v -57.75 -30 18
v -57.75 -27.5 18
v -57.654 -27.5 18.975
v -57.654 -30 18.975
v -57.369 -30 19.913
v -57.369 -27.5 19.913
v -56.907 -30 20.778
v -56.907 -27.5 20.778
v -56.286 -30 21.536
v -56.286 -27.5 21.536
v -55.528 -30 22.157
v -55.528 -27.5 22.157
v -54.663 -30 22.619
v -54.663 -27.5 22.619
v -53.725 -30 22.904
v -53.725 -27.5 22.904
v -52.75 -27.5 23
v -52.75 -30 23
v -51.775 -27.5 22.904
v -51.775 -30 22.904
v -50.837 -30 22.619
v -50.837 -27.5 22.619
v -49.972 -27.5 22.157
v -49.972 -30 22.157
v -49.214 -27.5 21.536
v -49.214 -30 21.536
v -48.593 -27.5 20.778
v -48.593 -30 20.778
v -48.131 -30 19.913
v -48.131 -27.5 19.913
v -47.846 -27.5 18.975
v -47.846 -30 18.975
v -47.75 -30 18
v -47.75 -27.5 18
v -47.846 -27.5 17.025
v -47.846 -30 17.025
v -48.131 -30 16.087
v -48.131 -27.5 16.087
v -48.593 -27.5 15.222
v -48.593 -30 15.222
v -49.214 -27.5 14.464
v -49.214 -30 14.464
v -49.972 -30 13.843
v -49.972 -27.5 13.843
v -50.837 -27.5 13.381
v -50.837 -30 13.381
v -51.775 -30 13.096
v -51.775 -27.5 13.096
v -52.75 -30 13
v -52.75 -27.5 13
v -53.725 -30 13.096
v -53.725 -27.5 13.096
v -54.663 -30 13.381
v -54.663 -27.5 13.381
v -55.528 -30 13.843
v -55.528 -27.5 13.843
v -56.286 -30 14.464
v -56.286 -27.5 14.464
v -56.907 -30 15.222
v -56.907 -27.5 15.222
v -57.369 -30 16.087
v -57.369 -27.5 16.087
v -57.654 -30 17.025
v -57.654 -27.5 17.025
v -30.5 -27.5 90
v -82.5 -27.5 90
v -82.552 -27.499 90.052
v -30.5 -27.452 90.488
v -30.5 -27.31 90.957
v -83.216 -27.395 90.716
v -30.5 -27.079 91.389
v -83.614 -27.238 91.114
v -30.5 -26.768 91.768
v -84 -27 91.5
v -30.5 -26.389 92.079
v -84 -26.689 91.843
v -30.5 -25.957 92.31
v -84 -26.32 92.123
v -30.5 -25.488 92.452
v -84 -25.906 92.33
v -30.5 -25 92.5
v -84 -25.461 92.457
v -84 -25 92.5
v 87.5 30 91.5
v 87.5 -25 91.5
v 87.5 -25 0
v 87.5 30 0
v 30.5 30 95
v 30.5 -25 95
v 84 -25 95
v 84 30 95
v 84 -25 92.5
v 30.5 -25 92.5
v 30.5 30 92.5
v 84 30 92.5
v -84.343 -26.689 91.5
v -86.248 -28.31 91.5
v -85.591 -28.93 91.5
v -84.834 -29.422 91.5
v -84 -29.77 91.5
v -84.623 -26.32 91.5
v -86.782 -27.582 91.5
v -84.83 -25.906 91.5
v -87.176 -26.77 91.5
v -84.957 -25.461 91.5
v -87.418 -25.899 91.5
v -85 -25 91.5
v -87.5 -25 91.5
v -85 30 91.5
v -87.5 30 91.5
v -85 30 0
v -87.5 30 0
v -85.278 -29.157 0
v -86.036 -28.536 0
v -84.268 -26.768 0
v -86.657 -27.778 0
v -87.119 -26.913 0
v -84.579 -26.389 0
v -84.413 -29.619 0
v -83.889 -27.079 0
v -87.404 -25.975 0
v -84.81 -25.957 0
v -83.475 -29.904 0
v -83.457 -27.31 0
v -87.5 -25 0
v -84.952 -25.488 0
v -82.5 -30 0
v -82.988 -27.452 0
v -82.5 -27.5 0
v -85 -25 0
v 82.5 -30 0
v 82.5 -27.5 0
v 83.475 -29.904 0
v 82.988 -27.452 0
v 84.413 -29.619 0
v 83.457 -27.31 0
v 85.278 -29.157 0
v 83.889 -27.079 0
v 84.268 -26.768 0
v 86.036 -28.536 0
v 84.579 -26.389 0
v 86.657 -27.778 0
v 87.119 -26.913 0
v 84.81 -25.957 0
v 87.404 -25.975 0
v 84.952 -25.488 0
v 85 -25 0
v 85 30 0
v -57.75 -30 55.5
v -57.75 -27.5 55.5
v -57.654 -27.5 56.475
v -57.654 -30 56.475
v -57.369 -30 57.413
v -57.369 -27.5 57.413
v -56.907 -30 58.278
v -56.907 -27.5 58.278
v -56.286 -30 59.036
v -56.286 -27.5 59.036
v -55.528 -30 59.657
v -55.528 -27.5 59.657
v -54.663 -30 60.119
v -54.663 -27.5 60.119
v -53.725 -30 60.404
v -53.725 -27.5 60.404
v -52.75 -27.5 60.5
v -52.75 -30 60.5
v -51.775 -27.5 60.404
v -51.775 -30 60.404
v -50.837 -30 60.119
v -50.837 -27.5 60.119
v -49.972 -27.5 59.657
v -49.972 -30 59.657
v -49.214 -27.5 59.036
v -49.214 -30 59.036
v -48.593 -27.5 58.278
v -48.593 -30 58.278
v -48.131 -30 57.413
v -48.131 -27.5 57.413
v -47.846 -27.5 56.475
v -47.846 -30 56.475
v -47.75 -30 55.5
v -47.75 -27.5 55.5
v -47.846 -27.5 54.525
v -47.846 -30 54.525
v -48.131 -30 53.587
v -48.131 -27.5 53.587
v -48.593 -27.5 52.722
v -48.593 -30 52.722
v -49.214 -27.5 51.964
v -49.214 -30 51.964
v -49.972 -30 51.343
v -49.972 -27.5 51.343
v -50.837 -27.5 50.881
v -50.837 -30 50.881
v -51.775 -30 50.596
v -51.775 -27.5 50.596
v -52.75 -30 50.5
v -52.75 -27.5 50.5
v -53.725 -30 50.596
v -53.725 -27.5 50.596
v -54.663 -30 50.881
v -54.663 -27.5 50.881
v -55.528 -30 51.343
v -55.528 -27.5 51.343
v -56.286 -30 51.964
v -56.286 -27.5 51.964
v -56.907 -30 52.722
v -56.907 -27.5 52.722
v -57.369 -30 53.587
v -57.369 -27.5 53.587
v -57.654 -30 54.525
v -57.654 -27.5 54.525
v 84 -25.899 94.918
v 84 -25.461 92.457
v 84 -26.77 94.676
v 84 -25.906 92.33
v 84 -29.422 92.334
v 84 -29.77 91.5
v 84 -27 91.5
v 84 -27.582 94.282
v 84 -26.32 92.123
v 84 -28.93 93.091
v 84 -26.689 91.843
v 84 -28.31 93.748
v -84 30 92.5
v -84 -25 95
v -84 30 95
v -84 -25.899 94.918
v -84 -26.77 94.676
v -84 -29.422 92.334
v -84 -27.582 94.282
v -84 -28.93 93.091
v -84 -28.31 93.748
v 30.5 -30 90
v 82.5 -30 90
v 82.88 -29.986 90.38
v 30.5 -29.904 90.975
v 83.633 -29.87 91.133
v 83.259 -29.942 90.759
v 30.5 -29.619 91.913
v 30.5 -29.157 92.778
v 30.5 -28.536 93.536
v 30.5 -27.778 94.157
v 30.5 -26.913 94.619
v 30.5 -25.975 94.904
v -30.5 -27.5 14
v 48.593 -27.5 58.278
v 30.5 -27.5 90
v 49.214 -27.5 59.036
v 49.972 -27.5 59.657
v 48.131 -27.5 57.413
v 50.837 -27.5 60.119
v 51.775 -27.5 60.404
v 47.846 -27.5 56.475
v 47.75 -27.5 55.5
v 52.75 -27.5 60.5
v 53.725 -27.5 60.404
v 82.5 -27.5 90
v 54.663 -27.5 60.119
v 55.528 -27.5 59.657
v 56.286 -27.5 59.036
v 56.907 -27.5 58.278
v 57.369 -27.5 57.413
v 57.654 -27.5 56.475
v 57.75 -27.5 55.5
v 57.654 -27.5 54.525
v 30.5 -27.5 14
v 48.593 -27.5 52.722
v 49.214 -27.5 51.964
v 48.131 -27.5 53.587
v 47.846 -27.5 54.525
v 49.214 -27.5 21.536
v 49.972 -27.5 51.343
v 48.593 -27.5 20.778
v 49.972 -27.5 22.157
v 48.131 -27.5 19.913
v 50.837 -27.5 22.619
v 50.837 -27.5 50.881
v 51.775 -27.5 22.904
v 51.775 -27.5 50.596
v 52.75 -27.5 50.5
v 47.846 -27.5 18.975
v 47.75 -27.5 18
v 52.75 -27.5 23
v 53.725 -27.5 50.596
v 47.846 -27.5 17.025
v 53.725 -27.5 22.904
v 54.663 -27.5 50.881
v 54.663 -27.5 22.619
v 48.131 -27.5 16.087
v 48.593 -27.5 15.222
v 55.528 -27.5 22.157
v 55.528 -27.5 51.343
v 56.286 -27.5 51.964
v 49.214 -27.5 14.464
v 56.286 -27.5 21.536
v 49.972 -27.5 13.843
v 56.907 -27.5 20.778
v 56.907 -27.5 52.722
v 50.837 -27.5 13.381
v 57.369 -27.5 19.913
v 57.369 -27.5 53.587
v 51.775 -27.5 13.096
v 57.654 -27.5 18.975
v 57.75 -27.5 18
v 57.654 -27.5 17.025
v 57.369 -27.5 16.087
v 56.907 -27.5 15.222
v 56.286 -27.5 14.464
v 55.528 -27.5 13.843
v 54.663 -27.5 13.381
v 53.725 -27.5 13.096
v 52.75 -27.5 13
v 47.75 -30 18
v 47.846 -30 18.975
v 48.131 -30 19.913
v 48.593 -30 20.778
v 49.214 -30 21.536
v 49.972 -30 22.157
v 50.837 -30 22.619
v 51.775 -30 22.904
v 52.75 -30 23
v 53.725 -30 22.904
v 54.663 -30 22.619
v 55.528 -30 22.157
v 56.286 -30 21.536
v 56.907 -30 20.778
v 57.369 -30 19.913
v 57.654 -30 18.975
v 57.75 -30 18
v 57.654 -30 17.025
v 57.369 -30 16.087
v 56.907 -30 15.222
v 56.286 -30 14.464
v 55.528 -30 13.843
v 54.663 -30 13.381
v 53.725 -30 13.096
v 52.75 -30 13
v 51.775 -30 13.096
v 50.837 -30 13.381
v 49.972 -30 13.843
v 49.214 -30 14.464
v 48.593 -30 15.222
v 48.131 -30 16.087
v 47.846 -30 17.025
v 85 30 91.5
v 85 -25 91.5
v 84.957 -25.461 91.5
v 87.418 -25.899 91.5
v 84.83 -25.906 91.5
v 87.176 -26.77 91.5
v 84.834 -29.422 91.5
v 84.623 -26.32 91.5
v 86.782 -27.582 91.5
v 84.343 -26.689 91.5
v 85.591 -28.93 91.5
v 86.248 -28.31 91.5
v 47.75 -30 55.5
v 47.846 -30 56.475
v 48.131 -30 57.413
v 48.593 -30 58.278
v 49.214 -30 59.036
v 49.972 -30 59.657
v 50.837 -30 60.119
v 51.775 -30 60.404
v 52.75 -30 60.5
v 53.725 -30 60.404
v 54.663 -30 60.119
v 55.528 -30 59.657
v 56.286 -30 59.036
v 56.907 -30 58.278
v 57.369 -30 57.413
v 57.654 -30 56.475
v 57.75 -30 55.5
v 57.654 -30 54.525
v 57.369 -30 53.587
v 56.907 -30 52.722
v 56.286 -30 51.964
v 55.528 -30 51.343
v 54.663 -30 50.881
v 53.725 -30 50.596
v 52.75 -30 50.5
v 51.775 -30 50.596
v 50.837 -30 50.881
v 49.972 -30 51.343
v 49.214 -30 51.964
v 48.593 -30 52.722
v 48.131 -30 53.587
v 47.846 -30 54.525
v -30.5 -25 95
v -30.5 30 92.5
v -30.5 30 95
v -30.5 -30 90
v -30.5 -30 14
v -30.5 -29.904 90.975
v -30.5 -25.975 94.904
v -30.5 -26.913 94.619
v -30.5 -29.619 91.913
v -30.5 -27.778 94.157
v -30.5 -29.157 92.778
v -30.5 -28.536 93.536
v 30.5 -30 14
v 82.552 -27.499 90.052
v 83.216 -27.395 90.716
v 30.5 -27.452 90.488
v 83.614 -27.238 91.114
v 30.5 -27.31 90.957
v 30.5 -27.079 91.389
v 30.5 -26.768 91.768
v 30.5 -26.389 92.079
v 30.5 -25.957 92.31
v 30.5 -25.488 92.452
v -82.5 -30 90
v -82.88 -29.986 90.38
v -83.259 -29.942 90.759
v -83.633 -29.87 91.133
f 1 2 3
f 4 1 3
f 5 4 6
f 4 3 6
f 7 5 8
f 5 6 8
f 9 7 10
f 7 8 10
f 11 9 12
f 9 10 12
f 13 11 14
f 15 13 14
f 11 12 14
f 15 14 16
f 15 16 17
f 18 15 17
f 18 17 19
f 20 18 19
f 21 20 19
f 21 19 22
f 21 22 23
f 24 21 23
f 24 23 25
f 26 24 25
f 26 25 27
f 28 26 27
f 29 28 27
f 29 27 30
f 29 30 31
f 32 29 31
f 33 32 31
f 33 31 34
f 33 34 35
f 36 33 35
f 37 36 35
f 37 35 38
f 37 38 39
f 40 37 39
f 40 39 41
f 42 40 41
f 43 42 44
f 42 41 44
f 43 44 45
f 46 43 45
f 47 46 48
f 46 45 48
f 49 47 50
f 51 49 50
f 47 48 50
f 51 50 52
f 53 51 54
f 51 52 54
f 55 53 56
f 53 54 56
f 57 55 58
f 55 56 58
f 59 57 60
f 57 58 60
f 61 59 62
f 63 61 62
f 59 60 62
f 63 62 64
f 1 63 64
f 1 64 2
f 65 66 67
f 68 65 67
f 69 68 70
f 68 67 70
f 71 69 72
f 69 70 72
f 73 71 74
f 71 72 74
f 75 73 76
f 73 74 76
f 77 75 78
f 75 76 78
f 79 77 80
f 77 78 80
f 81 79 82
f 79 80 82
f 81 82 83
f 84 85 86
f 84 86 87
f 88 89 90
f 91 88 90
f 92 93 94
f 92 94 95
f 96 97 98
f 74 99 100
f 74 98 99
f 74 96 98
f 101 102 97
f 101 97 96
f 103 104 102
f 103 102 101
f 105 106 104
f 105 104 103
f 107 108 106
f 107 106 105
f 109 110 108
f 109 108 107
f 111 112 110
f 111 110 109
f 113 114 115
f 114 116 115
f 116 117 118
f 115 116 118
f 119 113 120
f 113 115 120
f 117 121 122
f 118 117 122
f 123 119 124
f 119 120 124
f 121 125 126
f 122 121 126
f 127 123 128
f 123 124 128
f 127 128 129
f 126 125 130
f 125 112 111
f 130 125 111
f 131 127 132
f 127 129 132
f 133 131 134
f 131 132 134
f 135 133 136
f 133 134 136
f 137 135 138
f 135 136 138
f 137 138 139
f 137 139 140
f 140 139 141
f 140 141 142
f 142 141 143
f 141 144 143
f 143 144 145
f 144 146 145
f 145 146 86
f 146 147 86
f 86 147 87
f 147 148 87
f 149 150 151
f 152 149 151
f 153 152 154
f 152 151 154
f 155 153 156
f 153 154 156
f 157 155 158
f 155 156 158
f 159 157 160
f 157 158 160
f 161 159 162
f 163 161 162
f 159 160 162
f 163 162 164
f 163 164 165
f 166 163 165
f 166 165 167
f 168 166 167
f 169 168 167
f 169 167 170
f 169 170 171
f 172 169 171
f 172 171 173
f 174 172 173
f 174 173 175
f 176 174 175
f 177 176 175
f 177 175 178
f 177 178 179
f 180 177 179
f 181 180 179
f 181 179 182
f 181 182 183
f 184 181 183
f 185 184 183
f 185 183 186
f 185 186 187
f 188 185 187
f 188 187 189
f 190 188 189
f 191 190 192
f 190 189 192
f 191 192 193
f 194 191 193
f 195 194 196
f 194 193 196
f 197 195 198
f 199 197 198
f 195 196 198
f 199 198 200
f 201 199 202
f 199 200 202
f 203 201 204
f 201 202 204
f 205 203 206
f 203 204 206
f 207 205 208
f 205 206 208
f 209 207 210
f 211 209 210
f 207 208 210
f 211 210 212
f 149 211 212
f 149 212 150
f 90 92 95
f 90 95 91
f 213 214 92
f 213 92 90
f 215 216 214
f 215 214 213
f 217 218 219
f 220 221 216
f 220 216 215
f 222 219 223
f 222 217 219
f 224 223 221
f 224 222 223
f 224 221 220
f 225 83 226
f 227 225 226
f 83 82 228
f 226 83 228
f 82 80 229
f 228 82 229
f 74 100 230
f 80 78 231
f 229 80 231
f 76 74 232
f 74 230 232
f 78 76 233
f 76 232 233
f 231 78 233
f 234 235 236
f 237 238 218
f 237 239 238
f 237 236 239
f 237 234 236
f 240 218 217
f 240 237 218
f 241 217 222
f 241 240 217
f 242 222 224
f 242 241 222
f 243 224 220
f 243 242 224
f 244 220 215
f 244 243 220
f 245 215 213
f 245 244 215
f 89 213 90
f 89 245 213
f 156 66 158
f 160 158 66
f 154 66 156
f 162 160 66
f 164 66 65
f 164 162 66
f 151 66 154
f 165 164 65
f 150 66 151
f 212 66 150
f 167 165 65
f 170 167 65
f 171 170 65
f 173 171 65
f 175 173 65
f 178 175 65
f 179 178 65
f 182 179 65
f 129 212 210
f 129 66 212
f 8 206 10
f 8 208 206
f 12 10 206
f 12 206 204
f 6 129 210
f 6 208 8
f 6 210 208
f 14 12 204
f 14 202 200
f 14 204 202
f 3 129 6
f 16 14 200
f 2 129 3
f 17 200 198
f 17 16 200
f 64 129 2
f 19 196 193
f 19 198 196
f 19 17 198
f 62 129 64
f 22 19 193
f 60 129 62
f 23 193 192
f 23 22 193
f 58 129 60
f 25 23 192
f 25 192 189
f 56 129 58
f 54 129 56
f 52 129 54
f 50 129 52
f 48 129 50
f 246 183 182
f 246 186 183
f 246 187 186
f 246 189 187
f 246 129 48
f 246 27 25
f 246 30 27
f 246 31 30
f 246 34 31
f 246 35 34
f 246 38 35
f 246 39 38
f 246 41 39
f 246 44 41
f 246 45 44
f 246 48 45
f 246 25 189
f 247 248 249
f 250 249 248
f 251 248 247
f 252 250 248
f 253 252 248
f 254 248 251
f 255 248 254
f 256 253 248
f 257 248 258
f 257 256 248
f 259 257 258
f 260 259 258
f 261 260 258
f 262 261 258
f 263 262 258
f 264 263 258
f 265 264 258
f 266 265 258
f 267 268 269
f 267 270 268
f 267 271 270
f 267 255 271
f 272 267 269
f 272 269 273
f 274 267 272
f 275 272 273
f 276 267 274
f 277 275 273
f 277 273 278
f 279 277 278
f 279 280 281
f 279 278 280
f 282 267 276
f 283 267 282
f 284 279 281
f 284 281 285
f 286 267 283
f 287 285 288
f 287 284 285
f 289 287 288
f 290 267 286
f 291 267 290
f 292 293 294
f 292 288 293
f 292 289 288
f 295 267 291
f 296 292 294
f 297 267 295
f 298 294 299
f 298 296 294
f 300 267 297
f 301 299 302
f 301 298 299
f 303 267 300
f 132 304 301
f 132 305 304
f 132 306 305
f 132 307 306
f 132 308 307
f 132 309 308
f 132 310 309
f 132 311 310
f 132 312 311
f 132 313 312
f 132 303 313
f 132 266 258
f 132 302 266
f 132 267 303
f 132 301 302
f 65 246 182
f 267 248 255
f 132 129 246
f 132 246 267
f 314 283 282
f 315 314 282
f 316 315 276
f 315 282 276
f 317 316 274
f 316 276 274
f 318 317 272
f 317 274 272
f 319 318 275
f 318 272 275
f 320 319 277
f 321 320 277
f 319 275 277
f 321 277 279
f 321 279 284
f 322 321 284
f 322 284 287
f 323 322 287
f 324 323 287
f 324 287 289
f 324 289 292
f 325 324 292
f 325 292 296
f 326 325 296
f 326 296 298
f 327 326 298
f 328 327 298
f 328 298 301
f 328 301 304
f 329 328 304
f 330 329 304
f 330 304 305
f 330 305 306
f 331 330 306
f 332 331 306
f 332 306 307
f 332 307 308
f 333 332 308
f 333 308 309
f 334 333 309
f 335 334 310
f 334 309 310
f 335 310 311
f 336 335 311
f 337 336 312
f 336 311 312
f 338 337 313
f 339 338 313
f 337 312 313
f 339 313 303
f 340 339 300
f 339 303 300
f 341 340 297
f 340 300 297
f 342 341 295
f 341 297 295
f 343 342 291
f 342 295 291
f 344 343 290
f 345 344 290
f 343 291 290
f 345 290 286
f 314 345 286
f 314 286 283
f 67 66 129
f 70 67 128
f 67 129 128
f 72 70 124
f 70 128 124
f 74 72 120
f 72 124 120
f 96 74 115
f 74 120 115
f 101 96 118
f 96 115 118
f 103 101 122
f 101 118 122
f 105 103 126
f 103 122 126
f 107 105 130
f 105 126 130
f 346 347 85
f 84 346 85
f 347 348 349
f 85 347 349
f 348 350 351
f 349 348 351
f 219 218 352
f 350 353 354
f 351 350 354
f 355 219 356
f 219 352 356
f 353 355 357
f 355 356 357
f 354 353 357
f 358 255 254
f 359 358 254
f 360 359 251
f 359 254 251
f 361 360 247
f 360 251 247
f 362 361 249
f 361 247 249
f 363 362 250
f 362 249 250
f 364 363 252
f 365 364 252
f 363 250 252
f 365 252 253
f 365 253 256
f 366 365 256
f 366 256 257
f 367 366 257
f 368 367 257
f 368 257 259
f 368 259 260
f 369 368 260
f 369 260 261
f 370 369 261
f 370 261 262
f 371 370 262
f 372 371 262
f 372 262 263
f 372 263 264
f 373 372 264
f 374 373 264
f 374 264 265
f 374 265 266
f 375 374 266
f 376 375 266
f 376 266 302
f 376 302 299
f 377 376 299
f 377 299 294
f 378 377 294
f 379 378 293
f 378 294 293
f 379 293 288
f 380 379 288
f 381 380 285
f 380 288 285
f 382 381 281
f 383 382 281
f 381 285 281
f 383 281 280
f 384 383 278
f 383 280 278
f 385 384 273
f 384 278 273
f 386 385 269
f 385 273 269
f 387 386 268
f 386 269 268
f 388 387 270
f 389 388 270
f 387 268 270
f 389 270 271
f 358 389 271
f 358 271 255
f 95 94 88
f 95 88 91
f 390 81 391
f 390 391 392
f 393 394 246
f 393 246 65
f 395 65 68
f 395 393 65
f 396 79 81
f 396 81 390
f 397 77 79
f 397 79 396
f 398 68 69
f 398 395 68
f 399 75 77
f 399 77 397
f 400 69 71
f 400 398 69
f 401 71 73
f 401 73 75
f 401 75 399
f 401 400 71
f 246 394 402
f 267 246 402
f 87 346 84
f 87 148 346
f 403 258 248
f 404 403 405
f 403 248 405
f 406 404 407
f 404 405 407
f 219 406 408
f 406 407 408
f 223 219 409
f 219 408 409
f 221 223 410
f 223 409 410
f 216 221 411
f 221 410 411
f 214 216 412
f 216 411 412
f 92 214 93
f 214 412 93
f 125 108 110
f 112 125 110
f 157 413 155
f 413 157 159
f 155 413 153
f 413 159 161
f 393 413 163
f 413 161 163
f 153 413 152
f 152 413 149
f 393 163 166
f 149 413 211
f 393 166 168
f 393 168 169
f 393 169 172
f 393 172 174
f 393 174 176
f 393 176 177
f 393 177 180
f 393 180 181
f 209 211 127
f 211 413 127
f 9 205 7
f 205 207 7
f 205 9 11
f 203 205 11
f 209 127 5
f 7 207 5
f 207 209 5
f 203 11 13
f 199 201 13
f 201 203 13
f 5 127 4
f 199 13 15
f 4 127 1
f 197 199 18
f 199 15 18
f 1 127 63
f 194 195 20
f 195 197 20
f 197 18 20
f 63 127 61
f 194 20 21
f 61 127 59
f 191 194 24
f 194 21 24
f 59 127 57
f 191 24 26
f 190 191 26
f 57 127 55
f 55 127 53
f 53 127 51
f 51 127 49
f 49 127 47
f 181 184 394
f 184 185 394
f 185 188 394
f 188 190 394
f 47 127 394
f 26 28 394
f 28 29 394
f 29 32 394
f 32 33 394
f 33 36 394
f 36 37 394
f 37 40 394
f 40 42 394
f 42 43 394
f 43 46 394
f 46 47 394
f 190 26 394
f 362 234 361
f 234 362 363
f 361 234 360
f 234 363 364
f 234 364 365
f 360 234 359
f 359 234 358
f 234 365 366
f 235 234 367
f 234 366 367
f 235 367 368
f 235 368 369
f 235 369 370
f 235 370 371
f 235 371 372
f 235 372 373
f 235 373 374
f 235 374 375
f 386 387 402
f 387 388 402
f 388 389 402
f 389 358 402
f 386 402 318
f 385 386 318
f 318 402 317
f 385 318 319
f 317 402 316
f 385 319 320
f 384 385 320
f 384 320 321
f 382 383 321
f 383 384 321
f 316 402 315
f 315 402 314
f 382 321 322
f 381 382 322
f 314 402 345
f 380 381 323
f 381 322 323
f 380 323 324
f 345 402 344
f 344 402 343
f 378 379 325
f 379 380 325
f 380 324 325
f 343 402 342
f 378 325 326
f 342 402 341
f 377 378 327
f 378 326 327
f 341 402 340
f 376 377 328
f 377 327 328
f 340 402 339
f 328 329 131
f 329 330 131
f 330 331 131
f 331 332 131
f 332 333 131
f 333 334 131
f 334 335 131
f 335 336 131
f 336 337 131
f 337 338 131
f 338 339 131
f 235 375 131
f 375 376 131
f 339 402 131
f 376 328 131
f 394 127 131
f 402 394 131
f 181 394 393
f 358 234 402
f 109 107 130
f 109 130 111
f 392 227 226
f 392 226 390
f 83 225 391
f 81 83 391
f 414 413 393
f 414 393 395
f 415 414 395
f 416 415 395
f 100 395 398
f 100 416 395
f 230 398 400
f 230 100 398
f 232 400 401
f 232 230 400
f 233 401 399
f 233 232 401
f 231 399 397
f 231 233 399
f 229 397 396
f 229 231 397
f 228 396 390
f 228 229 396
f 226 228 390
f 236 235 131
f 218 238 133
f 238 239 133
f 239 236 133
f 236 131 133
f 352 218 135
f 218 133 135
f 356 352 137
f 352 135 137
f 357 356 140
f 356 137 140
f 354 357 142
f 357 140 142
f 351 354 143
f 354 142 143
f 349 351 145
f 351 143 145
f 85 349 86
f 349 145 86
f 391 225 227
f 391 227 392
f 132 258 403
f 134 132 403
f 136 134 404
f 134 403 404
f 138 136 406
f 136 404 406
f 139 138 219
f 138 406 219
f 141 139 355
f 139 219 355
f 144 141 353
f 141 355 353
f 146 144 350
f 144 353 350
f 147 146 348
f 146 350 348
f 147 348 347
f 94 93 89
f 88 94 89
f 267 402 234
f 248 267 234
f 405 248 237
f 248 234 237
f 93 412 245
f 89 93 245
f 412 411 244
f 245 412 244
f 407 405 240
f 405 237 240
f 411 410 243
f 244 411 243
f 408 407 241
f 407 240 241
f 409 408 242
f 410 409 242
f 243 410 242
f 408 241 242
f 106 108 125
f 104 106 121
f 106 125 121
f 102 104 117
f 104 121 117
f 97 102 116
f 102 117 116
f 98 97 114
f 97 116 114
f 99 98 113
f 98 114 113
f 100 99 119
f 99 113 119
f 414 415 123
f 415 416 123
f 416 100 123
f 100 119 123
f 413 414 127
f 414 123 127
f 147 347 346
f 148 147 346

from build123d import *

# Parameters (mm, degrees)
F0_W         = 175
F0_H         = 60
F1_DEPTH     = 95
F3_T         = -2.5
F2_W         = 61
F2_H         = 81
F4_DEPTH     = 60.001
F6_D         = 10
F7_W         = 3.5
F7_H         = 3.5
F8_DEPTH     = 60.001
F9_T1_DEPTH  = 116.5
F9_T3_DEPTH  = 78.5
F9_T5_DEPTH  = 78.5
F10_R        = 2.5
F11_T4_DEPTH = 96.25
F12_R        = 2.5
F13_T4_DEPTH = 96.25


# Not quite as in the source:
# - a fillet or chamfer that OpenCascade refuses, or shapes differently, is made with other operations: its cross-section is extruded or revolved along the edge and cut away or added


with BuildPart() as f1:
    # F0 (on Top) → F1 (new body)
    with BuildSketch(Plane.XY):
        Rectangle(F0_W, F0_H)
    extrude(amount=F1_DEPTH)

    # F3
    f3_openings = [f1.faces().sort_by_distance(p)[0] for p in [
        (0, 30, 47.5),
        (0, 0, 0),
    ]]
    offset(amount=F3_T, openings=f3_openings)

    # F2 (on face) → F4 (cut, through all)
    with BuildSketch(Plane.XZ.offset(30)):
        with Locations((0, 54.5)):
            Rectangle(F2_W, F2_H)
    extrude(amount=-F4_DEPTH, mode=Mode.SUBTRACT)

    # F6 (through all)
    with Locations(Plane.XZ.offset(30)):
        with Locations((52.75, 55.5), (52.75, 18), (-52.75, 18), (-52.75, 55.5)):
            Hole(F6_D / 2)

    # F7 (on face) → F8 (cut, through all)
    with BuildSketch(Plane.XZ.offset(30)):
        with Locations((-85.75, 93.25)):
            Rectangle(F7_W, F7_H)
        with Locations((85.75, 93.25)):
            Rectangle(F7_W, F7_H)
    extrude(amount=-F8_DEPTH, mode=Mode.SUBTRACT)

    # F9: fillet of radius 5 on 4 edges, made by hand

    # F9_s2 → F9_t1 (cut)
    with BuildSketch(Plane.XY.offset(-12.5)):
        with BuildLine():
            ThreePointArc((-87.5, -25), (-86.0355339059, -28.5355339059), (-82.5, -30))
            Line((-82.5, -30), (-87.5, -30))
            Line((-87.5, -30), (-87.5, -25))
        make_face()
        with BuildLine():
            ThreePointArc((82.5, -30), (86.0355339059, -28.5355339059), (87.5, -25))
            Line((87.5, -25), (87.5, -30))
            Line((87.5, -30), (82.5, -30))
        make_face()
    extrude(amount=F9_T1_DEPTH, mode=Mode.SUBTRACT)

    # F9_s4 → F9_t3 (cut)
    with BuildSketch(Plane.YZ.offset(-96.5)):
        with BuildLine():
            ThreePointArc((-30, 90), (-28.5355339059, 93.5355339059), (-25, 95))
            Line((-25, 95), (-30, 95))
            Line((-30, 95), (-30, 90))
        make_face()
    extrude(amount=F9_T3_DEPTH, mode=Mode.SUBTRACT)

    # F9_s6 → F9_t5 (cut)
    with BuildSketch(Plane.YZ.offset(18)):
        with BuildLine():
            ThreePointArc((-30, 90), (-28.5355339059, 93.5355339059), (-25, 95))
            Line((-25, 95), (-30, 95))
            Line((-30, 95), (-30, 90))
        make_face()
    extrude(amount=F9_T5_DEPTH, mode=Mode.SUBTRACT)

    # F10
    f10_edges = [f1.edges().sort_by_distance(p)[0] for p in [
        (57.25, -27.5, 92.5),
    ]]
    fillet(f10_edges, radius=F10_R)

    # F11: fillet of radius 2.5 on 1 edges, made by hand


with BuildPart() as f11_tool2:
    # F11_s3 → F11_t4 (new body)
    with BuildSketch(Plane.XY.offset(96.25)):
        with BuildLine():
            ThreePointArc((82.5, -27.5), (84.267766953, -26.767766953), (85, -25))
            Line((85, -25), (85, -27.5))
            Line((85, -27.5), (82.5, -27.5))
        make_face()
    extrude(amount=-F11_T4_DEPTH)

    split(bisect_by=Plane.XY.offset(91.5), keep=Keep.BOTTOM)


with BuildPart() as f1_1:
    add(f1.part)

    # F11_t1: union F11_tool2
    add(f11_tool2.part)

    # F12
    f12_edges = [f1_1.edges().sort_by_distance(p)[0] for p in [
        (-57.25, -27.5, 92.5),
    ]]
    fillet(f12_edges, radius=F12_R)

    # F13: fillet of radius 2.5 on 1 edges, made by hand


with BuildPart() as f13_tool2:
    # F13_s3 → F13_t4 (new body)
    with BuildSketch(Plane.XY):
        with BuildLine():
            ThreePointArc((-82.5, -27.5), (-84.267766953, -26.767766953), (-85, -25))
            Line((-85, -25), (-85, -27.5))
            Line((-85, -27.5), (-82.5, -27.5))
        make_face()
    extrude(amount=F13_T4_DEPTH)

    split(bisect_by=Plane.XY.offset(91.5), keep=Keep.BOTTOM)


with BuildPart() as f1_2:
    add(f1_1.part)

    # F13_t1: union F13_tool2
    add(f13_tool2.part)


solid = f1_2.part
